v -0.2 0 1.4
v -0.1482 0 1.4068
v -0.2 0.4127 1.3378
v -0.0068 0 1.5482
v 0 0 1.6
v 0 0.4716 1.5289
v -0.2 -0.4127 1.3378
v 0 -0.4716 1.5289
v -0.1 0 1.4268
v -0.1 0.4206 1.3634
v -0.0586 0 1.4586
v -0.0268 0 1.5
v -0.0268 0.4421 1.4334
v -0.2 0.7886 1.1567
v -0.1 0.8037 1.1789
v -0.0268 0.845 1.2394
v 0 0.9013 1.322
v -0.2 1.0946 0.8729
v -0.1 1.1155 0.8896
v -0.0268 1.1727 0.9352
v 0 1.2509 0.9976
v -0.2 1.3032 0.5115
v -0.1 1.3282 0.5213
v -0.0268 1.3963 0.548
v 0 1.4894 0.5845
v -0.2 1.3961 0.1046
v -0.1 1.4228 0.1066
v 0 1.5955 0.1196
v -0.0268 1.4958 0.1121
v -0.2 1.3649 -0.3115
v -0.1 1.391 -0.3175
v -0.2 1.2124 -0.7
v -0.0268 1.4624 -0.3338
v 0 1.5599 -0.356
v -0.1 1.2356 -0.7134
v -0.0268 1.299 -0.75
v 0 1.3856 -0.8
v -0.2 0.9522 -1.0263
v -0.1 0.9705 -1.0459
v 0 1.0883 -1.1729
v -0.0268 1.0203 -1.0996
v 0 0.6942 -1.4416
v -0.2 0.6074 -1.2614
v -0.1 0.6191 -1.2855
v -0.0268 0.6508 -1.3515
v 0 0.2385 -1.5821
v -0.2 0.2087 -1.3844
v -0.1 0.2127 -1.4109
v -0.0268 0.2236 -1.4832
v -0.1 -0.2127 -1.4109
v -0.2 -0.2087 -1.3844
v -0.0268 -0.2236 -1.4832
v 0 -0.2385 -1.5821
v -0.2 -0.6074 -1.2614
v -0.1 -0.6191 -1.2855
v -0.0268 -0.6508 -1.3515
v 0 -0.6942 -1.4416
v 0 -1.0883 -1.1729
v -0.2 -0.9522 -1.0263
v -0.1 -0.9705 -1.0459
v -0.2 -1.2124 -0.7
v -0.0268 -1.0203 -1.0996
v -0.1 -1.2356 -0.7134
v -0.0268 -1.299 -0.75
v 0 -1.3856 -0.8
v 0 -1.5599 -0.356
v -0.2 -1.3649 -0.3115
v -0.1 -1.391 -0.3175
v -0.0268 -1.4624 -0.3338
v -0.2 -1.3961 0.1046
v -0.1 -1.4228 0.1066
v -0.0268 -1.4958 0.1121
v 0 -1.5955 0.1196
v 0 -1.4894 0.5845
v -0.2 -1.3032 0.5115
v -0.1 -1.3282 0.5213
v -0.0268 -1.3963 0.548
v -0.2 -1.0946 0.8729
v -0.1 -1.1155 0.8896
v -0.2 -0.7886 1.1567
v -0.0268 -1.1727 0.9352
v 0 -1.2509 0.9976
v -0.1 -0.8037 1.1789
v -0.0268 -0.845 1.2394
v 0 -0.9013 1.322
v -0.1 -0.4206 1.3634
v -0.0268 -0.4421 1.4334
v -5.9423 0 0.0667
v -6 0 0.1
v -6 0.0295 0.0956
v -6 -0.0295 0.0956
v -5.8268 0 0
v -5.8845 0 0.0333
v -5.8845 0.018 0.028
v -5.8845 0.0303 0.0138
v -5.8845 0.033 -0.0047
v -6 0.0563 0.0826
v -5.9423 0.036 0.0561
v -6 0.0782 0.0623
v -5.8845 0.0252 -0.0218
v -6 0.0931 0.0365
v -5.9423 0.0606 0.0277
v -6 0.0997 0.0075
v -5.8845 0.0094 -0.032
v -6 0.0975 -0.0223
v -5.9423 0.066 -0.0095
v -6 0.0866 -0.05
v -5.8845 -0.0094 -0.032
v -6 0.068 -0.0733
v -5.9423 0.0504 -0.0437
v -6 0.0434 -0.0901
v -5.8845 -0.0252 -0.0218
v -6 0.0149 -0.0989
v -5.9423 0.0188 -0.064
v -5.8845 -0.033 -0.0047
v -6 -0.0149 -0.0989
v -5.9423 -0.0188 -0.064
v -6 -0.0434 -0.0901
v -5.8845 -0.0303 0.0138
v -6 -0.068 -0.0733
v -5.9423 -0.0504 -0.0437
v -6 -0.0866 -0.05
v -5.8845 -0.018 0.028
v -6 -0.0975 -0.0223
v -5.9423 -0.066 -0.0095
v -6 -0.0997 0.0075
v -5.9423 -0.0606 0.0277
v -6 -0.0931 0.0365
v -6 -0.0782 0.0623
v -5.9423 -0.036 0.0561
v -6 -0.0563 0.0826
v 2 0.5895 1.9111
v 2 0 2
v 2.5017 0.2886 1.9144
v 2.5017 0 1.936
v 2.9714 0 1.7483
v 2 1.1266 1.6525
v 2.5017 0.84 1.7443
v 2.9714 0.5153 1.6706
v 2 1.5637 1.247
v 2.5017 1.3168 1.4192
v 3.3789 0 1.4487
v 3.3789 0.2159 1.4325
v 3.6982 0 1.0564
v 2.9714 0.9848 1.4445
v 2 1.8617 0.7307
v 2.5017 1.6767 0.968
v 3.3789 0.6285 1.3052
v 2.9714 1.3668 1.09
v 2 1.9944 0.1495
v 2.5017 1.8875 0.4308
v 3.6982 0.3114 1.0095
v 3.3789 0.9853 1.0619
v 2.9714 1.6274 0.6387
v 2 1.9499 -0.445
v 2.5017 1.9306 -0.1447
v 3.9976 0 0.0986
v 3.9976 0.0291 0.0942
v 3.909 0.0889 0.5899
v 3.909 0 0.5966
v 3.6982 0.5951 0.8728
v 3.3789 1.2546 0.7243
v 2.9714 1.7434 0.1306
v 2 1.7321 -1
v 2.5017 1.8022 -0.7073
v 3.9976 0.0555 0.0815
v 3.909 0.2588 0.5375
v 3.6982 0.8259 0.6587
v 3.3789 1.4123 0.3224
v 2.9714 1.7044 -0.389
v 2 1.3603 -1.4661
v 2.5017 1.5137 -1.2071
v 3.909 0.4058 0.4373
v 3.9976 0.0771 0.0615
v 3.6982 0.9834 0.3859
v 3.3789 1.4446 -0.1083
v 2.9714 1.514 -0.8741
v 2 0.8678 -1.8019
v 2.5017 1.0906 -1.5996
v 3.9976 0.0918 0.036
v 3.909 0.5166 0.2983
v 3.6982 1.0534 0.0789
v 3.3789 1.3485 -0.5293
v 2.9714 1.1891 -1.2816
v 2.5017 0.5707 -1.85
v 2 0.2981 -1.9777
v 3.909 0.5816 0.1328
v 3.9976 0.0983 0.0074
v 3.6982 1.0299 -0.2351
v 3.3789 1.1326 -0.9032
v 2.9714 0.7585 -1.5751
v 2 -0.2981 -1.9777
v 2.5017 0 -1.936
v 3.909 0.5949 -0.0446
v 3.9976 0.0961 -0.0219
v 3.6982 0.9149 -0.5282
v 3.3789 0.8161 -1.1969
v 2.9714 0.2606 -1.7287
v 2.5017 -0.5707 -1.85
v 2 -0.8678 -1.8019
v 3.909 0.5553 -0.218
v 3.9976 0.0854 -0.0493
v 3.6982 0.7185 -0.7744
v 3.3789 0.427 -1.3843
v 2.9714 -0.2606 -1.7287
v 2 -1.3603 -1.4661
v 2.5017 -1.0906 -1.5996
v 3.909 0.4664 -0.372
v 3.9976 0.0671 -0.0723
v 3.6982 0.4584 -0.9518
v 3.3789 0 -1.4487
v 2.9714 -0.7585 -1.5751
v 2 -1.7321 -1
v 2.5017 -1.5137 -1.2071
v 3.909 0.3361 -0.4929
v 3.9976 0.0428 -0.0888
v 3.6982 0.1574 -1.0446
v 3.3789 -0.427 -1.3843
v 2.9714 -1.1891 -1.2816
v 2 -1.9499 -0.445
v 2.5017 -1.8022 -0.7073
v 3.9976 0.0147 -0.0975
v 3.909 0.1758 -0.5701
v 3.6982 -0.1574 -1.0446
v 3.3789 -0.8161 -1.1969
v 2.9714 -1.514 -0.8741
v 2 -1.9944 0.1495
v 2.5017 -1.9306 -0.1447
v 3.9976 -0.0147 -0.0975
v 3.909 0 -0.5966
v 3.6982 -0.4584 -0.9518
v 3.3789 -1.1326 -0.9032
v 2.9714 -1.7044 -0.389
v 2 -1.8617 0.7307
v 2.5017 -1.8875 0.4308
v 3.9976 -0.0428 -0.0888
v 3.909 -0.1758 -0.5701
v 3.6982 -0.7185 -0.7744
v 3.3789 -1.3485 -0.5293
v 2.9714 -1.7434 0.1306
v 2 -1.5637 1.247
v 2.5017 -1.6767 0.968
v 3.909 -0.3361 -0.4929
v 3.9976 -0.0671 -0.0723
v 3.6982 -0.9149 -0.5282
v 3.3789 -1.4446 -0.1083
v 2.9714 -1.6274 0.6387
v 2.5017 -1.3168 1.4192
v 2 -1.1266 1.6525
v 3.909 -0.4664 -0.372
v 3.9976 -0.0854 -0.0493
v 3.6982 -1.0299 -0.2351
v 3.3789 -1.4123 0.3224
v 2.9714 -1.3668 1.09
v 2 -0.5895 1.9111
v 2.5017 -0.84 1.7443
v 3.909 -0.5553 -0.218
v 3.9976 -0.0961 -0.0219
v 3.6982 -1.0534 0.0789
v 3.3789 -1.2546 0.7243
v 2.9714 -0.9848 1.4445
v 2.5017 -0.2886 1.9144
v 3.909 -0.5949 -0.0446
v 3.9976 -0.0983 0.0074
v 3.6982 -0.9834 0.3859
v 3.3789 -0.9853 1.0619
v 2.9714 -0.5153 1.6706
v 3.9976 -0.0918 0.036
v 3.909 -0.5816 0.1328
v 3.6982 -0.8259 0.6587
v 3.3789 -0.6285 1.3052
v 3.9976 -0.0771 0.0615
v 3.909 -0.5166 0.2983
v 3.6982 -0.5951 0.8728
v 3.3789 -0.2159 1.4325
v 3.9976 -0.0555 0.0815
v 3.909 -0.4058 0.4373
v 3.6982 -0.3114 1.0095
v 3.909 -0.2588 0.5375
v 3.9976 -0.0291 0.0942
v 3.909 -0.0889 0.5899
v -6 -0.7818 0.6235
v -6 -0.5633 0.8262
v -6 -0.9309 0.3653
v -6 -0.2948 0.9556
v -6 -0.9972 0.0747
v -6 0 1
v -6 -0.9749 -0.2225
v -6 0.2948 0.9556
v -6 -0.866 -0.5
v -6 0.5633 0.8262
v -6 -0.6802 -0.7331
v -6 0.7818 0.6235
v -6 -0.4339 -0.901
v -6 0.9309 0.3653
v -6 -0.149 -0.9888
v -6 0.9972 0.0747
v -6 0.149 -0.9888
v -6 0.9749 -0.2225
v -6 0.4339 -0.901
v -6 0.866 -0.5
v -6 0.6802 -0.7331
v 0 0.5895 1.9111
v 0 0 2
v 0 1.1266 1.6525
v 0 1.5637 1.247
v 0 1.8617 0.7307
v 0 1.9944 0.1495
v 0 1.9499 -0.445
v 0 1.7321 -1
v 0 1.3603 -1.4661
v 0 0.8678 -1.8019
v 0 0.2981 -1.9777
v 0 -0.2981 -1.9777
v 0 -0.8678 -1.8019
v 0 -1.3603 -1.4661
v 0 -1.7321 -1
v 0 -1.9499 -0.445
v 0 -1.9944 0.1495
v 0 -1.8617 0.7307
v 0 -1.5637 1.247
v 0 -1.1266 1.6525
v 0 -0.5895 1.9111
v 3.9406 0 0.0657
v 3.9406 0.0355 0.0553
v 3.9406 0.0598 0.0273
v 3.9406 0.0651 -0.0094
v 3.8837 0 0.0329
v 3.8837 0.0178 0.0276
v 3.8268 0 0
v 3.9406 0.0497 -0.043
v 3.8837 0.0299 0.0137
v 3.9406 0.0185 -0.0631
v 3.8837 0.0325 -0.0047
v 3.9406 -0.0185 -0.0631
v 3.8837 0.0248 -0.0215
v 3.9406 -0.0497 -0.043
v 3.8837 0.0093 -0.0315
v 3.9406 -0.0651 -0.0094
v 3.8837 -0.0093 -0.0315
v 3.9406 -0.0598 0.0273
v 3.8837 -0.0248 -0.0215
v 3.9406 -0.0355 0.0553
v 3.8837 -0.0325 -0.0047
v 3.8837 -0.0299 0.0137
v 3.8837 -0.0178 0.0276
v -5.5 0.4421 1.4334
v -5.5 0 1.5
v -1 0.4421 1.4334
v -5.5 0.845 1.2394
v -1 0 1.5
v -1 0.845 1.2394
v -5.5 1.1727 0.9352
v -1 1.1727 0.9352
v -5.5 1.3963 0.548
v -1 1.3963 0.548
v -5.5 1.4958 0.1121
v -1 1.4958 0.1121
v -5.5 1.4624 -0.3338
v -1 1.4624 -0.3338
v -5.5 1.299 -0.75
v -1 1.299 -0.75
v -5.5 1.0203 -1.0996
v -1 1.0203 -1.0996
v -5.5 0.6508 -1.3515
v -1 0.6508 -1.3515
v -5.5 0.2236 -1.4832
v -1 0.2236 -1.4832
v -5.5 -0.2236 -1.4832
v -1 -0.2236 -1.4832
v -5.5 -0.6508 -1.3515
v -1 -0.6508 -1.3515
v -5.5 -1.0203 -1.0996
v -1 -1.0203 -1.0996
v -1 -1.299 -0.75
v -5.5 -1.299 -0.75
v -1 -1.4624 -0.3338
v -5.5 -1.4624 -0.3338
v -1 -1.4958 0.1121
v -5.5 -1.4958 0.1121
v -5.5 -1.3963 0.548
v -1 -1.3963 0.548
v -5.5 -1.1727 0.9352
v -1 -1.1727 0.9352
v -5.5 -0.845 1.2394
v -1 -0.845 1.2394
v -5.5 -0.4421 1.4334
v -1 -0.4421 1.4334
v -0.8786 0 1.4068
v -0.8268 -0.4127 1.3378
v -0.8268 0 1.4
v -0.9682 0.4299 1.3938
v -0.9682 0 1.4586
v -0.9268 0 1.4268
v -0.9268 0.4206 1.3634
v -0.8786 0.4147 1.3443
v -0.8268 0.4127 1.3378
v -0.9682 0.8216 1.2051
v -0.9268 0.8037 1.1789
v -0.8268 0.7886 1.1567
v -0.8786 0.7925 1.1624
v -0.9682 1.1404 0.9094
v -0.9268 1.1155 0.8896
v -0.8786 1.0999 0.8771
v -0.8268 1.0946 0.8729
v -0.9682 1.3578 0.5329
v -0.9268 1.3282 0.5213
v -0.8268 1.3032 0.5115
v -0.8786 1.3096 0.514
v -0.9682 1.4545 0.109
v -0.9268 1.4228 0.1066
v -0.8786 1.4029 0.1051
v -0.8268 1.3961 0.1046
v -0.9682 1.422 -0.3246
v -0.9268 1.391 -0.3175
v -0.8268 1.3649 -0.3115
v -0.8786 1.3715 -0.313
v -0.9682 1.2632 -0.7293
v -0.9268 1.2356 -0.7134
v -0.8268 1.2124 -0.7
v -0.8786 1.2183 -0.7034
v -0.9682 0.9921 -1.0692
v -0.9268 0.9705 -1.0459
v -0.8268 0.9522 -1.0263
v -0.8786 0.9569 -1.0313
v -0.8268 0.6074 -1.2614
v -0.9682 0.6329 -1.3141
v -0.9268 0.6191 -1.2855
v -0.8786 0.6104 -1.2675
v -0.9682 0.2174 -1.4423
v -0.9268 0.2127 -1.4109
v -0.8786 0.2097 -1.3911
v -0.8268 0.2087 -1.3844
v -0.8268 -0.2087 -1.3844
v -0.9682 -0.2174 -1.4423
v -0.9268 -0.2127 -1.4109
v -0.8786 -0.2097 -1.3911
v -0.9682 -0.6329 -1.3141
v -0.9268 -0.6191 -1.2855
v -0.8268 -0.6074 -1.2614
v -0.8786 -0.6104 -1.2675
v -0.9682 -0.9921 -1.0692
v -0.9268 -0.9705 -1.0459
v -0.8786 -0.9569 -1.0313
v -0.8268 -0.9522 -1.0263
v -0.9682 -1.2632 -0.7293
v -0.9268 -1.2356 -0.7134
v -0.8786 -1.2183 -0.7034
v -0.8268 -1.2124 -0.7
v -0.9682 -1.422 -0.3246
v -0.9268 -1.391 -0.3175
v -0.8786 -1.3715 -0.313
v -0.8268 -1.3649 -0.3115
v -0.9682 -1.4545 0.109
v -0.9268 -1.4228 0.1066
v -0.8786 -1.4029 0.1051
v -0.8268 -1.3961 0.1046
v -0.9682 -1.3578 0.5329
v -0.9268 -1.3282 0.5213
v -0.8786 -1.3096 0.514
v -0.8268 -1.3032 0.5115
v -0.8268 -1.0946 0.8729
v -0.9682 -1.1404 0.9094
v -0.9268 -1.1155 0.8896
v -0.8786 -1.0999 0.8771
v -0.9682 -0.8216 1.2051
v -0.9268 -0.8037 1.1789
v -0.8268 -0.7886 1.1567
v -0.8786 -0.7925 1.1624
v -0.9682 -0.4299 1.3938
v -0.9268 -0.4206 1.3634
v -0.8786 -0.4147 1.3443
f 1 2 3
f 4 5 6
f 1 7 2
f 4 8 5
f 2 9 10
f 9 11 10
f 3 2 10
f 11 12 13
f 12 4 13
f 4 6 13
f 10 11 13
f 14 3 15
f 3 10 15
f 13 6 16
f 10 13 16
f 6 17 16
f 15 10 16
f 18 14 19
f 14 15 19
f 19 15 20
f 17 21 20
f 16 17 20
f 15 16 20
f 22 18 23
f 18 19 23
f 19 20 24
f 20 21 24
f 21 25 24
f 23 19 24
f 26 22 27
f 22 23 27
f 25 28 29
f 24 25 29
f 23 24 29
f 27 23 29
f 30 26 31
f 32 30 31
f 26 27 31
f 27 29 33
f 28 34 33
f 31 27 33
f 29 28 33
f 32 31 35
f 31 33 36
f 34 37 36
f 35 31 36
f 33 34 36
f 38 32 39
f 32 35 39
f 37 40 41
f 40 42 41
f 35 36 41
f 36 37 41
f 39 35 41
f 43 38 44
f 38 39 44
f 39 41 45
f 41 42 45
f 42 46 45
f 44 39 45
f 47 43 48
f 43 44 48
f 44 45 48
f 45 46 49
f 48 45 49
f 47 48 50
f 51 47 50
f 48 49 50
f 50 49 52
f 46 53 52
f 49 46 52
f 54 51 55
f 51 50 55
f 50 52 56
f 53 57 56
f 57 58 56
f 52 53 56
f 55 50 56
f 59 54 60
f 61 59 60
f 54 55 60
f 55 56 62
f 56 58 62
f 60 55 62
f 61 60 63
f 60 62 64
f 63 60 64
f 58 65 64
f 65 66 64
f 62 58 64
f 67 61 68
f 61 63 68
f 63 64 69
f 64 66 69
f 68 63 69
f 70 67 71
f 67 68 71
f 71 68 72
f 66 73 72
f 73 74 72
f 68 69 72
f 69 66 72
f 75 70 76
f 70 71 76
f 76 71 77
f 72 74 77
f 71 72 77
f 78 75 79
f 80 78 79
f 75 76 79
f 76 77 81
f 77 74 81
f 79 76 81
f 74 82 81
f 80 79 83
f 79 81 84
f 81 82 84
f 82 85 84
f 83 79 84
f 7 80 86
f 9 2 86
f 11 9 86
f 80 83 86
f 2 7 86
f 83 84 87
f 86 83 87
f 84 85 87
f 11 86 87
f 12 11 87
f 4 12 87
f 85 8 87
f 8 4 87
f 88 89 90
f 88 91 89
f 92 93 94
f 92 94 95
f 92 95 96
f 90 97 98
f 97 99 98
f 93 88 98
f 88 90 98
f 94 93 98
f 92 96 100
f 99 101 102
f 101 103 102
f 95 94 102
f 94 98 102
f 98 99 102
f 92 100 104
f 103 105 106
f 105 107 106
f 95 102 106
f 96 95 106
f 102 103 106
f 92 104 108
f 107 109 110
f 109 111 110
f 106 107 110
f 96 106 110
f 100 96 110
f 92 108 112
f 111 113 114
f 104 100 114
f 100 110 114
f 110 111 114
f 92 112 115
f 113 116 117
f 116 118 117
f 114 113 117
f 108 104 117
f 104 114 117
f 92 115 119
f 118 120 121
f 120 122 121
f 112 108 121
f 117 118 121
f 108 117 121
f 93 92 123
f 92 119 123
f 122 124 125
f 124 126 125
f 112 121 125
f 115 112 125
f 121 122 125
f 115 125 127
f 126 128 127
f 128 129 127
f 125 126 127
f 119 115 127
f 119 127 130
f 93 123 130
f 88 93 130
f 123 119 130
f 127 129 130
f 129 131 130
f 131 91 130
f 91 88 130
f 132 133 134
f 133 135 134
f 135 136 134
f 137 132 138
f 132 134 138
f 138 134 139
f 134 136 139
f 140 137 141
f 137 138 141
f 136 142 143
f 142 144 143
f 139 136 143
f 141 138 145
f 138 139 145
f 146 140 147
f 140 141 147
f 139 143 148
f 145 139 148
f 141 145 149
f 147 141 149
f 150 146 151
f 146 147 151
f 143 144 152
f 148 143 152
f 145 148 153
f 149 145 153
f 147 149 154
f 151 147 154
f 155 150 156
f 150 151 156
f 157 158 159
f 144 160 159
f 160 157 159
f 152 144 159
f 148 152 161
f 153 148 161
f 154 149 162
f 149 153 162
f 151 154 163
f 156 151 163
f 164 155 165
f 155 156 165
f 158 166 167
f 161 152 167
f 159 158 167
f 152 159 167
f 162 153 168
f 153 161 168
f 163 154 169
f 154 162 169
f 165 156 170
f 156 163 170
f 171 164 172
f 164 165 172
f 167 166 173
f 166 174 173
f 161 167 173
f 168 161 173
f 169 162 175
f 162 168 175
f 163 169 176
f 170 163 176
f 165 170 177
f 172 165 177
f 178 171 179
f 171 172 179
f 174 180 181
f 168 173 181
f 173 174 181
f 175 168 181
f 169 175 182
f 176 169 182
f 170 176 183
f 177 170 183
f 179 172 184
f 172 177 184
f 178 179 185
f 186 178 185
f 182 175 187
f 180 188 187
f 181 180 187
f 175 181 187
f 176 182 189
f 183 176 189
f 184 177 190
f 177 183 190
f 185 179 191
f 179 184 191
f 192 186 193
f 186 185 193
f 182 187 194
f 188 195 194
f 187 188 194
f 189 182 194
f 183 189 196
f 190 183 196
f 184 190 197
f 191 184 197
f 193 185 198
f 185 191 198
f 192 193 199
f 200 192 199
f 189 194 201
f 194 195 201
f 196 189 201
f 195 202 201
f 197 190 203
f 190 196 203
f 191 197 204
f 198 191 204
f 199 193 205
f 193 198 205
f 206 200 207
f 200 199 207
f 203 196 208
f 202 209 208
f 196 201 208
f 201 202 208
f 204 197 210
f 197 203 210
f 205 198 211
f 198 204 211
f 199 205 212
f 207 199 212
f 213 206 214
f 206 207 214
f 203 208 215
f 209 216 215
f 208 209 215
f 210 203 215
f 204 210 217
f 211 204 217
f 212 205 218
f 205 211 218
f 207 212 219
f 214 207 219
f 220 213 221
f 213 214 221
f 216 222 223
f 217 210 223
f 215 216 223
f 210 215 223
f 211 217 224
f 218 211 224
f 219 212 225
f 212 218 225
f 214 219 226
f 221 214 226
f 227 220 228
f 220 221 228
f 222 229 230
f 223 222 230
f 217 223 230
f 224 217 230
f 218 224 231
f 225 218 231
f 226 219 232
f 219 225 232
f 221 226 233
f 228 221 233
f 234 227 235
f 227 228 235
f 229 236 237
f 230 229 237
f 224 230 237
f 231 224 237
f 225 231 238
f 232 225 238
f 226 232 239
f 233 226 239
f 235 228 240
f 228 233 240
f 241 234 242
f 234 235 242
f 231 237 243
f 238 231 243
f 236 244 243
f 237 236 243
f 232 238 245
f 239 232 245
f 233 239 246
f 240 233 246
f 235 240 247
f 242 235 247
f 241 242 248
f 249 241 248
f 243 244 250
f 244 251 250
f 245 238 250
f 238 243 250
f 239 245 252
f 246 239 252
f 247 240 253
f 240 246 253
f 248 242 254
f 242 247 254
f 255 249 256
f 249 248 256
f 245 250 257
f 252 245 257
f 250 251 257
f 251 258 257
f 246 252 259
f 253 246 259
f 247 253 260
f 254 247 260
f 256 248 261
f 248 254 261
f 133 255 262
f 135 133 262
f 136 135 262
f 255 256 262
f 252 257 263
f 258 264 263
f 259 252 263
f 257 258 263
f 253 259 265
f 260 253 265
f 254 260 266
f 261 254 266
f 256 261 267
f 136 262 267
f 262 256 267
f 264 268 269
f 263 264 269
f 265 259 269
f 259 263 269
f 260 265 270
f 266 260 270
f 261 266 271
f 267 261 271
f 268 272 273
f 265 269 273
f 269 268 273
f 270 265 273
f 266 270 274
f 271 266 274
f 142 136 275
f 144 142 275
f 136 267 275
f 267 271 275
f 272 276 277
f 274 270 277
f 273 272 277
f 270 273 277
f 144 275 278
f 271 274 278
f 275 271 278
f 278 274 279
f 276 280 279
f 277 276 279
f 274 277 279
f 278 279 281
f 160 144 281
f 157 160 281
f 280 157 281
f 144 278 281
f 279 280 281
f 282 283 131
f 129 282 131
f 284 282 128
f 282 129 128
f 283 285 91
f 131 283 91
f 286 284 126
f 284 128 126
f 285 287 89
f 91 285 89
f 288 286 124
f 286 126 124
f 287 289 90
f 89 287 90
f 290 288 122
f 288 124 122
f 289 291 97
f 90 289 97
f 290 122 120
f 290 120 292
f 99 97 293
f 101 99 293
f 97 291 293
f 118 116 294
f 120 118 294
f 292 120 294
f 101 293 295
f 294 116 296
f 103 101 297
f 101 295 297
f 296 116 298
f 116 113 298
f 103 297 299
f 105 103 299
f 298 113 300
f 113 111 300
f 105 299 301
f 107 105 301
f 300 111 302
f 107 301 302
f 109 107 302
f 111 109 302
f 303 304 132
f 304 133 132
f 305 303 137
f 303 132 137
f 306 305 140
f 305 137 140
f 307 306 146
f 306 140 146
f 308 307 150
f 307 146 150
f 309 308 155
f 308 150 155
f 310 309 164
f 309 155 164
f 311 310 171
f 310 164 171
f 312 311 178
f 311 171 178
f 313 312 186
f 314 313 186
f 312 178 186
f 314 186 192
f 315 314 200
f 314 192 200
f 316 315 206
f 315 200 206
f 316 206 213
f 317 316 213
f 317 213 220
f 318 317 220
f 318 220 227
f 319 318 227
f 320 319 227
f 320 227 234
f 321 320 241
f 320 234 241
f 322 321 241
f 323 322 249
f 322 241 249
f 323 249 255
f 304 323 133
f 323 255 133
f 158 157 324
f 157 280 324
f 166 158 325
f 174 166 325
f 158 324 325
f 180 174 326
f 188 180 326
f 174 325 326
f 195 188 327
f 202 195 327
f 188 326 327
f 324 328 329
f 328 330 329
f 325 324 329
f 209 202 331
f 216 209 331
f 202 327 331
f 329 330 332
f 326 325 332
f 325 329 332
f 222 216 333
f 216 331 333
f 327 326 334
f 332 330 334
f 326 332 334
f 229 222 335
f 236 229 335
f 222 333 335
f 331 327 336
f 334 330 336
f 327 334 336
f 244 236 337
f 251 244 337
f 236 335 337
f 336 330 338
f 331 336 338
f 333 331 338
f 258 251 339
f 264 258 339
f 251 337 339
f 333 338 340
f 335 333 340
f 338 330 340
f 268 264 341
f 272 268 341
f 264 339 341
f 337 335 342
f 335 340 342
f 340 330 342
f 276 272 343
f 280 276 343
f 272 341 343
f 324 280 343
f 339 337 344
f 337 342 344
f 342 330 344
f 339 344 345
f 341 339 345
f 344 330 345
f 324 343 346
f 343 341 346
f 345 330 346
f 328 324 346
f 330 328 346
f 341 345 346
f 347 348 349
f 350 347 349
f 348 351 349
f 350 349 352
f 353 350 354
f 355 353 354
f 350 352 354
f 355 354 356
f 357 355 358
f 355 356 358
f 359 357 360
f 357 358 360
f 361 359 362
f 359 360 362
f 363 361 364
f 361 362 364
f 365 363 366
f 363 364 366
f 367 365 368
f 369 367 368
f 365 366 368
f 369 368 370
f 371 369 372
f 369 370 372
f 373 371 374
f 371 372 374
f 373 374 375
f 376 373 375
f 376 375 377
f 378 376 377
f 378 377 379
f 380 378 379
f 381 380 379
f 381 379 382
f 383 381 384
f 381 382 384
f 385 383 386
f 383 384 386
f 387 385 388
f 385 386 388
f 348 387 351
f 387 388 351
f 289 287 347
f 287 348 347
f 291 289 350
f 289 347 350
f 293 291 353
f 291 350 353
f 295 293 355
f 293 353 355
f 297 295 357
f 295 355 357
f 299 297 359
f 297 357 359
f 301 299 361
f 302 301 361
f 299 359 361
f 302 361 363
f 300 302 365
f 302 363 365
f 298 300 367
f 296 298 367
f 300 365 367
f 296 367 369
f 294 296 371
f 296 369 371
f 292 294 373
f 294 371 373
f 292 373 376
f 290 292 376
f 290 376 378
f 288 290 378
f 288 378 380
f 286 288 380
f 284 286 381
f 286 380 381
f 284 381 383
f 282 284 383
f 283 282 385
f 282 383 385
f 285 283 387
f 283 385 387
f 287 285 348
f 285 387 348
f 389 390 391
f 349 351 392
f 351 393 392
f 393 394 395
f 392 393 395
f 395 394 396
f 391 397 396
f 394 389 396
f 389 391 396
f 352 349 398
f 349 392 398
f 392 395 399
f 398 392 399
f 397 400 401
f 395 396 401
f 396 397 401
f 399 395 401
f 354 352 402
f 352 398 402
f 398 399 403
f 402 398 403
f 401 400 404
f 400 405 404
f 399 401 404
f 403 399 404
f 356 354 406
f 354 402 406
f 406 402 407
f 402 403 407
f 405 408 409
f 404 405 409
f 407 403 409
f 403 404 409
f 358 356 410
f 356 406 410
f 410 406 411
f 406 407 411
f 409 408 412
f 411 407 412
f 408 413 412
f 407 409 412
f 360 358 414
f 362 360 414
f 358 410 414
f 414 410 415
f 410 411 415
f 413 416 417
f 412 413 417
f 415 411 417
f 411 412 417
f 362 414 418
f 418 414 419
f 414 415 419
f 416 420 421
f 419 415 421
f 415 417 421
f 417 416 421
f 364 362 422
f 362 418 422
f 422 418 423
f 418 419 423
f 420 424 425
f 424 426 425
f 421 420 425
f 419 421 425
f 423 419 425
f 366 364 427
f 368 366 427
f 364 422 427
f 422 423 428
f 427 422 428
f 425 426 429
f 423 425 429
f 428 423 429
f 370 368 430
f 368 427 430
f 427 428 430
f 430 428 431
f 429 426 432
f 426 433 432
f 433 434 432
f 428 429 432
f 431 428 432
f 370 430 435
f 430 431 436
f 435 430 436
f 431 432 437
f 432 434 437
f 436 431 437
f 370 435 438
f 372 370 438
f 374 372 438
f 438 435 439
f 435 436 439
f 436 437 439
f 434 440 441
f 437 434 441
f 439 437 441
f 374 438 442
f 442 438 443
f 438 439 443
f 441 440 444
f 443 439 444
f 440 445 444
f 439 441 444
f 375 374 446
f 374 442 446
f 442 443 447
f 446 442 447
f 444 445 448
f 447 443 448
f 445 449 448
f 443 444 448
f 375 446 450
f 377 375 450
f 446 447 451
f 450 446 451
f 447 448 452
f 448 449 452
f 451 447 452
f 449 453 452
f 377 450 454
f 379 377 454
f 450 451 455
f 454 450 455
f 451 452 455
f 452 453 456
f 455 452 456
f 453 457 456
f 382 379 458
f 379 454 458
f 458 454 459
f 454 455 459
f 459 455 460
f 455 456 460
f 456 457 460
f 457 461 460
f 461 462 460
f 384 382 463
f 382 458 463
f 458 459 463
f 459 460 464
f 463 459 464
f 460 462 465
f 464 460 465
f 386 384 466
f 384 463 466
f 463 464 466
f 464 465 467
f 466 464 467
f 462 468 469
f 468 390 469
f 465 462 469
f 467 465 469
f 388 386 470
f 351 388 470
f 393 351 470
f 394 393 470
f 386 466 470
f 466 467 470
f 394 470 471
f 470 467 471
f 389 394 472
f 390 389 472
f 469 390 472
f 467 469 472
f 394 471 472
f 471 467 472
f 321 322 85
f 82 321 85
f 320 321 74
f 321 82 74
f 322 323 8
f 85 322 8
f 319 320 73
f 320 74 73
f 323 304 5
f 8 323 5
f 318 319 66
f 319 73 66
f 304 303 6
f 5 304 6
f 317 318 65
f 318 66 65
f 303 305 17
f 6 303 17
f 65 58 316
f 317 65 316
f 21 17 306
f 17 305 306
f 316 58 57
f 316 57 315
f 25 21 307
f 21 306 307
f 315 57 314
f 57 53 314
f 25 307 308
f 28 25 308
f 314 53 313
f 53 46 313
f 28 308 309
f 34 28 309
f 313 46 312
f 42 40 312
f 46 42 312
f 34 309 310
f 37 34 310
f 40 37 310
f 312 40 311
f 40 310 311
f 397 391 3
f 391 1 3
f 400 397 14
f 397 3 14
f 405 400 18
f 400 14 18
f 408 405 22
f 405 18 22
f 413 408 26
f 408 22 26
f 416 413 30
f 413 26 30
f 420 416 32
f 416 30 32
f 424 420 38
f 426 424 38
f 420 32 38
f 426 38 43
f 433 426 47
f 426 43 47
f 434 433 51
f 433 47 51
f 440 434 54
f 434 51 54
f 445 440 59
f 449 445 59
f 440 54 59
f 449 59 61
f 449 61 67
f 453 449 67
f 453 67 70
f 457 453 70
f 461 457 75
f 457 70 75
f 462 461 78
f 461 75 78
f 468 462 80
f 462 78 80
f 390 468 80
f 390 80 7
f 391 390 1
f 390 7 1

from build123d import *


with BuildPart() as part:
    # Sketch1 → Revolve1 (revolve)
    with BuildSketch(Plane(origin=(0, 0, 0), x_dir=(-1, 0, 0), z_dir=(0, 0, -1)), mode=Mode.PRIVATE) as revolve1_sk:
        with BuildLine():
            Line((-3.997568228, 0.098596016), (-3.826794919, 0))
            Line((-3.826794919, 0), (5.826794919, 0))
            Line((5.826794919, 0), (6, 0.1))
            Line((6, 0.1), (6, 1))
            Line((6, 1), (5.5, 1.5))
            Line((5.5, 1.5), (1, 1.5))
            ThreePointArc((1, 1.5), (0.926794919, 1.426794919), (0.826794919, 1.4))
            Line((0.826794919, 1.4), (0.2, 1.4))
            ThreePointArc((0.2, 1.4), (0.058578644, 1.458578644), (0, 1.6))
            Line((0, 1.6), (0, 2))
            Line((0, 2), (-2, 2))
            ThreePointArc((-2, 2), (-3.37891406, 1.448653173), (-3.997568228, 0.098596016))
        make_face()
    revolve(revolve1_sk.sketch.rotate(Axis((4.002354589, 0, 0), (-1, 0, 0)), 270), axis=Axis((4.002354589, 0, 0), (-1, 0, 0)))


solid = part.part
